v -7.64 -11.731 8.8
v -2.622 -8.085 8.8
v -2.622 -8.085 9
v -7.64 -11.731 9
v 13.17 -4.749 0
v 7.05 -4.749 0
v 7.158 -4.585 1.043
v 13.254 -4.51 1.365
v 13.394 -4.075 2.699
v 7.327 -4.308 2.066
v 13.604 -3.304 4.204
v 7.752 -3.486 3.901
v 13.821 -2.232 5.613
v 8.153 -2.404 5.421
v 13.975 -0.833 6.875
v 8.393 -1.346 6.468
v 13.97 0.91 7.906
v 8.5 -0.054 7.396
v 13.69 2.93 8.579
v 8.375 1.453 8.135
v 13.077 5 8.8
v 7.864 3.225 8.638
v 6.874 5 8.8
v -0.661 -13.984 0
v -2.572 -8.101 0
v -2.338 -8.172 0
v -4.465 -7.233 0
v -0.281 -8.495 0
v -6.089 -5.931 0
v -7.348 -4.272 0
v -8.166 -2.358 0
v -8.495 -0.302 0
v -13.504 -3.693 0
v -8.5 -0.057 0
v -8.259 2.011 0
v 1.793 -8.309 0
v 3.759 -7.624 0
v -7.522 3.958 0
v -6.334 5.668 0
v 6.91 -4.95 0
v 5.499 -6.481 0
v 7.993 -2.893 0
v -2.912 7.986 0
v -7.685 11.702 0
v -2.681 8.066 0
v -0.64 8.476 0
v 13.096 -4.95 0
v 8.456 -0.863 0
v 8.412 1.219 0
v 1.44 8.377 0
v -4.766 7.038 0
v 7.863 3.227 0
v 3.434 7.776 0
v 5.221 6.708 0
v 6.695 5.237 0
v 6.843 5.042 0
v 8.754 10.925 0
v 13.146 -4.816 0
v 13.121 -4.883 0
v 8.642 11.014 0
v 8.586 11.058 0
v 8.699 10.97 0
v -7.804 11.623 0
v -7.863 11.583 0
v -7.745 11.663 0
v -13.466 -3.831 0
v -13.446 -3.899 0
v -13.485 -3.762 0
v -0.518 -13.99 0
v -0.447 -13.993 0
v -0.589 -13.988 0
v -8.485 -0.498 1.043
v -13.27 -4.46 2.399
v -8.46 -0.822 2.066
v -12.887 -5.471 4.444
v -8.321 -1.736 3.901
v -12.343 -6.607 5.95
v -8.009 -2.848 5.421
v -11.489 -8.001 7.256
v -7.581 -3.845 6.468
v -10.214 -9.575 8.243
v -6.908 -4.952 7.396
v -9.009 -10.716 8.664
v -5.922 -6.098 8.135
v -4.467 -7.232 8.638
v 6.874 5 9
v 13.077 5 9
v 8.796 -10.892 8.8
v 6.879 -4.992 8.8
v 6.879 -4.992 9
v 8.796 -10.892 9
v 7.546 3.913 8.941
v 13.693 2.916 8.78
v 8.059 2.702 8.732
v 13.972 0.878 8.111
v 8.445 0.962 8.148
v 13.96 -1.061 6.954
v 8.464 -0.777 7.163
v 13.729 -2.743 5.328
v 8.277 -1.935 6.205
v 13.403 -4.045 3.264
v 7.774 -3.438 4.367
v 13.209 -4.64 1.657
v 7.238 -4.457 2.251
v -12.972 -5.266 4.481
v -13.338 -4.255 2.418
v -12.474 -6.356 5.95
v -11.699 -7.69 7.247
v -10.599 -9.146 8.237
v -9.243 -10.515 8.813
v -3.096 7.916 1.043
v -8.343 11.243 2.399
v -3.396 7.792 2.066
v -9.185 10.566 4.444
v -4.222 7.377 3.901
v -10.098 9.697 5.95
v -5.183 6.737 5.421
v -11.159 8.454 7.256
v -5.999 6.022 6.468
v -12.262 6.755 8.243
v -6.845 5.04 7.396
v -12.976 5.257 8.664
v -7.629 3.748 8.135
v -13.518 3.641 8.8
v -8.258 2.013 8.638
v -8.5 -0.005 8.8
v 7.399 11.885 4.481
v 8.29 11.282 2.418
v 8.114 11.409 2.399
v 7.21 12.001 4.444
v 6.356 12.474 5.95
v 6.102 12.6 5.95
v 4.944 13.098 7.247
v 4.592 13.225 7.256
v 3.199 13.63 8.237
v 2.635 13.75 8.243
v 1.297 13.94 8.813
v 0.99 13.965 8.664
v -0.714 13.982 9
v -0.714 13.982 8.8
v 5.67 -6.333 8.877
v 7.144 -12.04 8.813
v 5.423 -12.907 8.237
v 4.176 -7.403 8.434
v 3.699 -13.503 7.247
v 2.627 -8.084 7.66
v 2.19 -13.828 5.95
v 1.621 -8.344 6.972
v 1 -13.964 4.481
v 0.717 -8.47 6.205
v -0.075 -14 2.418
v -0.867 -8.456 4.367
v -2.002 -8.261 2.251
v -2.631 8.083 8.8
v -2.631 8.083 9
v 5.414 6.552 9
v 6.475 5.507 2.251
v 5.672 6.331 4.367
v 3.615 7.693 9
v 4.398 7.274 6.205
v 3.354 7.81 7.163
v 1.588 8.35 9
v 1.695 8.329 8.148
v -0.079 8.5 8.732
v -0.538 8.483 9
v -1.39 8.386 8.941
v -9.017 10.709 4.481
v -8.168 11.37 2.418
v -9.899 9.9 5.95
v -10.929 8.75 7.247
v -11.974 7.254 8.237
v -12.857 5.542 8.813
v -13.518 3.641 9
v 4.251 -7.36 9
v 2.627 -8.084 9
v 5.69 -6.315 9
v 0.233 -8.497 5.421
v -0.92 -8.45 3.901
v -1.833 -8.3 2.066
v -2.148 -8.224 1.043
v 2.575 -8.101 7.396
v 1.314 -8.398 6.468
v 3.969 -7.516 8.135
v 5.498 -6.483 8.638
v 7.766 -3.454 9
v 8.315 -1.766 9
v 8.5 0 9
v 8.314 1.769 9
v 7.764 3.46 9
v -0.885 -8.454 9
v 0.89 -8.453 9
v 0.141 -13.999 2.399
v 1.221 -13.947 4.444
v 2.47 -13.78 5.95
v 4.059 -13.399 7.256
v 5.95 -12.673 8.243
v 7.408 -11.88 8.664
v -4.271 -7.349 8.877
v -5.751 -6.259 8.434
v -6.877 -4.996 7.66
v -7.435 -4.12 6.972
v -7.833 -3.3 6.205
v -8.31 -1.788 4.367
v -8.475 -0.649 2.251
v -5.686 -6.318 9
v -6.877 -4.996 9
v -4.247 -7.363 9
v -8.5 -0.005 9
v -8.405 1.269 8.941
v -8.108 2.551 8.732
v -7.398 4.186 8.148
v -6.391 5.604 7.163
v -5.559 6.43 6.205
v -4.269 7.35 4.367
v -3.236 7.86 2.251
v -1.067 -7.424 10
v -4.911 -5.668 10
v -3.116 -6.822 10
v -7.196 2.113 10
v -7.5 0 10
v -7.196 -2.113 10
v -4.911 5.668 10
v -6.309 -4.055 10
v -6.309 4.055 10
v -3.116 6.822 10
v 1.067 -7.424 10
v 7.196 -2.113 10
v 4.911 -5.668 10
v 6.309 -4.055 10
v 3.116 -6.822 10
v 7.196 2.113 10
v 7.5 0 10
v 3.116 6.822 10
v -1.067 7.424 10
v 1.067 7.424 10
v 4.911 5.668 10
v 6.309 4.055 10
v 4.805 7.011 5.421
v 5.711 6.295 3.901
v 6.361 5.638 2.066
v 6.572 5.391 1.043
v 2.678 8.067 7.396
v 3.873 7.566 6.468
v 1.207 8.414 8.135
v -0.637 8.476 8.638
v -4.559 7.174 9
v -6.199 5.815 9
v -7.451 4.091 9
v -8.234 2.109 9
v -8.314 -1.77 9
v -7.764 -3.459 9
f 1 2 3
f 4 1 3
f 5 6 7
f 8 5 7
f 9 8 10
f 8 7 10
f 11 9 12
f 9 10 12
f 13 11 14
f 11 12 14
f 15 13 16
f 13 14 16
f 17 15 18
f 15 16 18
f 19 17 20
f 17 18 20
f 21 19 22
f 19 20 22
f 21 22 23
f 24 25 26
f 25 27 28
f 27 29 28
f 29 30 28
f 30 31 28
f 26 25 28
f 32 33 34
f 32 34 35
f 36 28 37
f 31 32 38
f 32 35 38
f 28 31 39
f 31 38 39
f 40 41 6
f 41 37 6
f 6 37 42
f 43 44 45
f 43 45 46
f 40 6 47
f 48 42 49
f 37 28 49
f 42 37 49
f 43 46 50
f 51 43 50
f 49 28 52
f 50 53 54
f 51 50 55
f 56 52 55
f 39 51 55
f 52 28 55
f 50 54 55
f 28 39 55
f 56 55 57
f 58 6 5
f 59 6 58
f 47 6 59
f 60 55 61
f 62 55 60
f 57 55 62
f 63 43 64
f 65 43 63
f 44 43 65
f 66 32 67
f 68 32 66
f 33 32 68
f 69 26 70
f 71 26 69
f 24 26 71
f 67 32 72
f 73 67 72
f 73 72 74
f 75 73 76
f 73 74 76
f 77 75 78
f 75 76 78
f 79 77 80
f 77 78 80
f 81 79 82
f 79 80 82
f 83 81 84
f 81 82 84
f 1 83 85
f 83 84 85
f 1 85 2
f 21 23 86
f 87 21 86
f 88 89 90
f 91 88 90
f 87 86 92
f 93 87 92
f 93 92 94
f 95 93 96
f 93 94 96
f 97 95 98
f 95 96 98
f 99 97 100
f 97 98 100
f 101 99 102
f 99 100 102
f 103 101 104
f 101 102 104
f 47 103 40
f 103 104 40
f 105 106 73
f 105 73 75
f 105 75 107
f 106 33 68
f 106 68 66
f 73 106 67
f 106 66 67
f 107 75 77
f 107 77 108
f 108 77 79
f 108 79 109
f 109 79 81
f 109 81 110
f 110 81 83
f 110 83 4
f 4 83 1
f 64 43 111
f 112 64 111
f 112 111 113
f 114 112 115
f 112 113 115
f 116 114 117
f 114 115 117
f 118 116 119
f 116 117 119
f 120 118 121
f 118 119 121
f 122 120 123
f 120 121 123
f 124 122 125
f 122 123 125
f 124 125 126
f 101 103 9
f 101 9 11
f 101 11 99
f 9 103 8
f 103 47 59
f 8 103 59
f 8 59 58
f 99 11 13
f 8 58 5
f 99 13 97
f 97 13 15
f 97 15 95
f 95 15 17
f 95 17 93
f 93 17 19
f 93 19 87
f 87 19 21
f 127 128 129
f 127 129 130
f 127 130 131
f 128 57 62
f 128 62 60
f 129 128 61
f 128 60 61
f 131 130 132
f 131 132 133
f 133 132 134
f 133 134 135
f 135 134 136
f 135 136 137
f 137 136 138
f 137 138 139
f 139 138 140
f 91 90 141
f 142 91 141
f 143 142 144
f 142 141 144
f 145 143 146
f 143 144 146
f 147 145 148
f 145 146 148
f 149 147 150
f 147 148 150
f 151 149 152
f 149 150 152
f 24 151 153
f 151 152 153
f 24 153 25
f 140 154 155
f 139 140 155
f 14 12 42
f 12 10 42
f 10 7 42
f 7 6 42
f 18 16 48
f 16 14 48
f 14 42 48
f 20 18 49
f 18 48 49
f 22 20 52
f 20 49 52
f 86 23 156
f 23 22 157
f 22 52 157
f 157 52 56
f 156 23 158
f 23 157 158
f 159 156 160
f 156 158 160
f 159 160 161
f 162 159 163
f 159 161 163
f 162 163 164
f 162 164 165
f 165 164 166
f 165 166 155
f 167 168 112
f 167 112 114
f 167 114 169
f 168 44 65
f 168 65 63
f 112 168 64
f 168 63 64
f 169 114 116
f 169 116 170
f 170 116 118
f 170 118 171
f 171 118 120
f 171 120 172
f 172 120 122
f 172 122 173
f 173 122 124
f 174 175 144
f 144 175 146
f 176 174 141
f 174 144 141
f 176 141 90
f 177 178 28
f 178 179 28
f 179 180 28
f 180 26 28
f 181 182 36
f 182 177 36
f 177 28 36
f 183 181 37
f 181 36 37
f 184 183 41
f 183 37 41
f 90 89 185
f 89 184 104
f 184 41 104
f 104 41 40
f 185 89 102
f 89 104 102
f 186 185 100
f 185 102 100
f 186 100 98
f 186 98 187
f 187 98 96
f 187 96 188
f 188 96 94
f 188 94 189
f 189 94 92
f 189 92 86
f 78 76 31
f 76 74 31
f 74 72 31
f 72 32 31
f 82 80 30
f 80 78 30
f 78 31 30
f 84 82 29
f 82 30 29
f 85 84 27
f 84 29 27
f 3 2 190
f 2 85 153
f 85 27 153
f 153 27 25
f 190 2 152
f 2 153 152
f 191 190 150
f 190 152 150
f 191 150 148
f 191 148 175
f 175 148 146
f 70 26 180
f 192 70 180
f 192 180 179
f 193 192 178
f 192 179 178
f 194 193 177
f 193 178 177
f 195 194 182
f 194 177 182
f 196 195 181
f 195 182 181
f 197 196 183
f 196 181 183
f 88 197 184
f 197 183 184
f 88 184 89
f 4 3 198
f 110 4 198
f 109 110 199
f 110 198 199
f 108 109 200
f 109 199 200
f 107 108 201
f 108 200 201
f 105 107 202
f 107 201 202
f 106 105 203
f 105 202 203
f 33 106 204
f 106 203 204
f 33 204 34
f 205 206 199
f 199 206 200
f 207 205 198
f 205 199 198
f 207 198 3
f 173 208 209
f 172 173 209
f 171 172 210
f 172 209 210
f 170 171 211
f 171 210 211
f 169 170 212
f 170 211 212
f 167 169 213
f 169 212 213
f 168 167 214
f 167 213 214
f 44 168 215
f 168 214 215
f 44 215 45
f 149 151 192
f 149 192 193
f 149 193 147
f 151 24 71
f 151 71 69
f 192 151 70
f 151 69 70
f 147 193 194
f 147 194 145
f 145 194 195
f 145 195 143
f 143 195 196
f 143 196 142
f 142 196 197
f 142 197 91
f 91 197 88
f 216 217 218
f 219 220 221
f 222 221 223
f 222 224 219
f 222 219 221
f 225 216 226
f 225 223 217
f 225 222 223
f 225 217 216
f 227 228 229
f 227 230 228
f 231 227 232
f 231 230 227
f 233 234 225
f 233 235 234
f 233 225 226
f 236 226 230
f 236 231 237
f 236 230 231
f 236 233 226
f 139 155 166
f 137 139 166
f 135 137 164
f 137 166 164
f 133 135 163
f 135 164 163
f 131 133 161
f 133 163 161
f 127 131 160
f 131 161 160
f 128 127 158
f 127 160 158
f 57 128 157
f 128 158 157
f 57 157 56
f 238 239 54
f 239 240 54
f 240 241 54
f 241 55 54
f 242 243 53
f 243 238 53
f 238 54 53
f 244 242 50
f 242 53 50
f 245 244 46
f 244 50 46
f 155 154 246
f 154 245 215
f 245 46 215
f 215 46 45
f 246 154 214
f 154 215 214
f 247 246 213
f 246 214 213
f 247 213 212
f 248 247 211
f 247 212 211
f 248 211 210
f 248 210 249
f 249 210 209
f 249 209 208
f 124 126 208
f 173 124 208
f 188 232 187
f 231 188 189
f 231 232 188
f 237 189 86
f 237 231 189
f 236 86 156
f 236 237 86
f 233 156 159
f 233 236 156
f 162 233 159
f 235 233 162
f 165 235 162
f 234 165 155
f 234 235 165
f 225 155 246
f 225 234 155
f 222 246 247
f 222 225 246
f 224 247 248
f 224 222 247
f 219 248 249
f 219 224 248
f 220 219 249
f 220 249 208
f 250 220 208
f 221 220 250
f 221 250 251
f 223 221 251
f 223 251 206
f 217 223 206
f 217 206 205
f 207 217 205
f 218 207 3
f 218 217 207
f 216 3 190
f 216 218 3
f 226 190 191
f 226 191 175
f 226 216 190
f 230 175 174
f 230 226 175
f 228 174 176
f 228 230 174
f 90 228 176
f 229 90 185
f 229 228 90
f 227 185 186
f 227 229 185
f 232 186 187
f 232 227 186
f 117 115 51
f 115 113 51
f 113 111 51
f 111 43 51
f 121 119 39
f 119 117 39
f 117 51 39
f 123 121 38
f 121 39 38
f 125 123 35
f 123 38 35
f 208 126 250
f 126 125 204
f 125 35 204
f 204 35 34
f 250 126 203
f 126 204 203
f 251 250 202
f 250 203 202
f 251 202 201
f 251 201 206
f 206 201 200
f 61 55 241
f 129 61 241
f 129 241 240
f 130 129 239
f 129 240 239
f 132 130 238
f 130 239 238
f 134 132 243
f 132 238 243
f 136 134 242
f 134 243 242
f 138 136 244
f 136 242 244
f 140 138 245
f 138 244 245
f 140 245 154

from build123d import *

# Parameters (mm, degrees)
F0_R     = 8.5
F1_DEPTH = 10
F2_SIZE  = 1
F4_DEPTH = 25
F6_COUNT = 5
F7_R     = 30
F7_R_2   = 14
F8_DEPTH = 25


with BuildPart() as f1:
    # F0 (on Top) → F1 (new body)
    with BuildSketch(Plane.XY):
        Circle(F0_R)
    extrude(amount=F1_DEPTH)

    # F2
    f2_edges = [f1.edges().sort_by_distance(p)[0] for p in [
        (-8.5, 0, 10),
    ]]
    chamfer(f2_edges, length=F2_SIZE)

    # F3 (on Right) → F4 (join)
    with BuildSketch(Plane.YZ):
        with BuildLine():
            Line((5, 8.8), (5, 9))
            ThreePointArc((5, 9), (-1.7082039325, 6.4161984871), (-4.9498743711, 0))
            Line((-4.9498743711, 0), (-4.7488460856, 0))
            ThreePointArc((-4.7488460856, 0), (-1.5665820638, 6.2746133918), (5, 8.8))
        make_face()
    extrude(amount=F4_DEPTH)

    # F6: F1 ×5 about axis
    f6_axis = Axis((0, 0, 8.4288474172), (0, 0, 1))


with BuildPart() as f1_1:
    add(f1.part)
    for i in range(1, F6_COUNT):
        add(f1.part.rotate(f6_axis, i * 360 / F6_COUNT))

    # F7 (on Top) → F8 (cut)
    with BuildSketch(Plane.XY):
        Circle(F7_R)
        Circle(F7_R_2, mode=Mode.SUBTRACT)
    extrude(amount=F8_DEPTH, mode=Mode.SUBTRACT)


solid = f1_1.part
